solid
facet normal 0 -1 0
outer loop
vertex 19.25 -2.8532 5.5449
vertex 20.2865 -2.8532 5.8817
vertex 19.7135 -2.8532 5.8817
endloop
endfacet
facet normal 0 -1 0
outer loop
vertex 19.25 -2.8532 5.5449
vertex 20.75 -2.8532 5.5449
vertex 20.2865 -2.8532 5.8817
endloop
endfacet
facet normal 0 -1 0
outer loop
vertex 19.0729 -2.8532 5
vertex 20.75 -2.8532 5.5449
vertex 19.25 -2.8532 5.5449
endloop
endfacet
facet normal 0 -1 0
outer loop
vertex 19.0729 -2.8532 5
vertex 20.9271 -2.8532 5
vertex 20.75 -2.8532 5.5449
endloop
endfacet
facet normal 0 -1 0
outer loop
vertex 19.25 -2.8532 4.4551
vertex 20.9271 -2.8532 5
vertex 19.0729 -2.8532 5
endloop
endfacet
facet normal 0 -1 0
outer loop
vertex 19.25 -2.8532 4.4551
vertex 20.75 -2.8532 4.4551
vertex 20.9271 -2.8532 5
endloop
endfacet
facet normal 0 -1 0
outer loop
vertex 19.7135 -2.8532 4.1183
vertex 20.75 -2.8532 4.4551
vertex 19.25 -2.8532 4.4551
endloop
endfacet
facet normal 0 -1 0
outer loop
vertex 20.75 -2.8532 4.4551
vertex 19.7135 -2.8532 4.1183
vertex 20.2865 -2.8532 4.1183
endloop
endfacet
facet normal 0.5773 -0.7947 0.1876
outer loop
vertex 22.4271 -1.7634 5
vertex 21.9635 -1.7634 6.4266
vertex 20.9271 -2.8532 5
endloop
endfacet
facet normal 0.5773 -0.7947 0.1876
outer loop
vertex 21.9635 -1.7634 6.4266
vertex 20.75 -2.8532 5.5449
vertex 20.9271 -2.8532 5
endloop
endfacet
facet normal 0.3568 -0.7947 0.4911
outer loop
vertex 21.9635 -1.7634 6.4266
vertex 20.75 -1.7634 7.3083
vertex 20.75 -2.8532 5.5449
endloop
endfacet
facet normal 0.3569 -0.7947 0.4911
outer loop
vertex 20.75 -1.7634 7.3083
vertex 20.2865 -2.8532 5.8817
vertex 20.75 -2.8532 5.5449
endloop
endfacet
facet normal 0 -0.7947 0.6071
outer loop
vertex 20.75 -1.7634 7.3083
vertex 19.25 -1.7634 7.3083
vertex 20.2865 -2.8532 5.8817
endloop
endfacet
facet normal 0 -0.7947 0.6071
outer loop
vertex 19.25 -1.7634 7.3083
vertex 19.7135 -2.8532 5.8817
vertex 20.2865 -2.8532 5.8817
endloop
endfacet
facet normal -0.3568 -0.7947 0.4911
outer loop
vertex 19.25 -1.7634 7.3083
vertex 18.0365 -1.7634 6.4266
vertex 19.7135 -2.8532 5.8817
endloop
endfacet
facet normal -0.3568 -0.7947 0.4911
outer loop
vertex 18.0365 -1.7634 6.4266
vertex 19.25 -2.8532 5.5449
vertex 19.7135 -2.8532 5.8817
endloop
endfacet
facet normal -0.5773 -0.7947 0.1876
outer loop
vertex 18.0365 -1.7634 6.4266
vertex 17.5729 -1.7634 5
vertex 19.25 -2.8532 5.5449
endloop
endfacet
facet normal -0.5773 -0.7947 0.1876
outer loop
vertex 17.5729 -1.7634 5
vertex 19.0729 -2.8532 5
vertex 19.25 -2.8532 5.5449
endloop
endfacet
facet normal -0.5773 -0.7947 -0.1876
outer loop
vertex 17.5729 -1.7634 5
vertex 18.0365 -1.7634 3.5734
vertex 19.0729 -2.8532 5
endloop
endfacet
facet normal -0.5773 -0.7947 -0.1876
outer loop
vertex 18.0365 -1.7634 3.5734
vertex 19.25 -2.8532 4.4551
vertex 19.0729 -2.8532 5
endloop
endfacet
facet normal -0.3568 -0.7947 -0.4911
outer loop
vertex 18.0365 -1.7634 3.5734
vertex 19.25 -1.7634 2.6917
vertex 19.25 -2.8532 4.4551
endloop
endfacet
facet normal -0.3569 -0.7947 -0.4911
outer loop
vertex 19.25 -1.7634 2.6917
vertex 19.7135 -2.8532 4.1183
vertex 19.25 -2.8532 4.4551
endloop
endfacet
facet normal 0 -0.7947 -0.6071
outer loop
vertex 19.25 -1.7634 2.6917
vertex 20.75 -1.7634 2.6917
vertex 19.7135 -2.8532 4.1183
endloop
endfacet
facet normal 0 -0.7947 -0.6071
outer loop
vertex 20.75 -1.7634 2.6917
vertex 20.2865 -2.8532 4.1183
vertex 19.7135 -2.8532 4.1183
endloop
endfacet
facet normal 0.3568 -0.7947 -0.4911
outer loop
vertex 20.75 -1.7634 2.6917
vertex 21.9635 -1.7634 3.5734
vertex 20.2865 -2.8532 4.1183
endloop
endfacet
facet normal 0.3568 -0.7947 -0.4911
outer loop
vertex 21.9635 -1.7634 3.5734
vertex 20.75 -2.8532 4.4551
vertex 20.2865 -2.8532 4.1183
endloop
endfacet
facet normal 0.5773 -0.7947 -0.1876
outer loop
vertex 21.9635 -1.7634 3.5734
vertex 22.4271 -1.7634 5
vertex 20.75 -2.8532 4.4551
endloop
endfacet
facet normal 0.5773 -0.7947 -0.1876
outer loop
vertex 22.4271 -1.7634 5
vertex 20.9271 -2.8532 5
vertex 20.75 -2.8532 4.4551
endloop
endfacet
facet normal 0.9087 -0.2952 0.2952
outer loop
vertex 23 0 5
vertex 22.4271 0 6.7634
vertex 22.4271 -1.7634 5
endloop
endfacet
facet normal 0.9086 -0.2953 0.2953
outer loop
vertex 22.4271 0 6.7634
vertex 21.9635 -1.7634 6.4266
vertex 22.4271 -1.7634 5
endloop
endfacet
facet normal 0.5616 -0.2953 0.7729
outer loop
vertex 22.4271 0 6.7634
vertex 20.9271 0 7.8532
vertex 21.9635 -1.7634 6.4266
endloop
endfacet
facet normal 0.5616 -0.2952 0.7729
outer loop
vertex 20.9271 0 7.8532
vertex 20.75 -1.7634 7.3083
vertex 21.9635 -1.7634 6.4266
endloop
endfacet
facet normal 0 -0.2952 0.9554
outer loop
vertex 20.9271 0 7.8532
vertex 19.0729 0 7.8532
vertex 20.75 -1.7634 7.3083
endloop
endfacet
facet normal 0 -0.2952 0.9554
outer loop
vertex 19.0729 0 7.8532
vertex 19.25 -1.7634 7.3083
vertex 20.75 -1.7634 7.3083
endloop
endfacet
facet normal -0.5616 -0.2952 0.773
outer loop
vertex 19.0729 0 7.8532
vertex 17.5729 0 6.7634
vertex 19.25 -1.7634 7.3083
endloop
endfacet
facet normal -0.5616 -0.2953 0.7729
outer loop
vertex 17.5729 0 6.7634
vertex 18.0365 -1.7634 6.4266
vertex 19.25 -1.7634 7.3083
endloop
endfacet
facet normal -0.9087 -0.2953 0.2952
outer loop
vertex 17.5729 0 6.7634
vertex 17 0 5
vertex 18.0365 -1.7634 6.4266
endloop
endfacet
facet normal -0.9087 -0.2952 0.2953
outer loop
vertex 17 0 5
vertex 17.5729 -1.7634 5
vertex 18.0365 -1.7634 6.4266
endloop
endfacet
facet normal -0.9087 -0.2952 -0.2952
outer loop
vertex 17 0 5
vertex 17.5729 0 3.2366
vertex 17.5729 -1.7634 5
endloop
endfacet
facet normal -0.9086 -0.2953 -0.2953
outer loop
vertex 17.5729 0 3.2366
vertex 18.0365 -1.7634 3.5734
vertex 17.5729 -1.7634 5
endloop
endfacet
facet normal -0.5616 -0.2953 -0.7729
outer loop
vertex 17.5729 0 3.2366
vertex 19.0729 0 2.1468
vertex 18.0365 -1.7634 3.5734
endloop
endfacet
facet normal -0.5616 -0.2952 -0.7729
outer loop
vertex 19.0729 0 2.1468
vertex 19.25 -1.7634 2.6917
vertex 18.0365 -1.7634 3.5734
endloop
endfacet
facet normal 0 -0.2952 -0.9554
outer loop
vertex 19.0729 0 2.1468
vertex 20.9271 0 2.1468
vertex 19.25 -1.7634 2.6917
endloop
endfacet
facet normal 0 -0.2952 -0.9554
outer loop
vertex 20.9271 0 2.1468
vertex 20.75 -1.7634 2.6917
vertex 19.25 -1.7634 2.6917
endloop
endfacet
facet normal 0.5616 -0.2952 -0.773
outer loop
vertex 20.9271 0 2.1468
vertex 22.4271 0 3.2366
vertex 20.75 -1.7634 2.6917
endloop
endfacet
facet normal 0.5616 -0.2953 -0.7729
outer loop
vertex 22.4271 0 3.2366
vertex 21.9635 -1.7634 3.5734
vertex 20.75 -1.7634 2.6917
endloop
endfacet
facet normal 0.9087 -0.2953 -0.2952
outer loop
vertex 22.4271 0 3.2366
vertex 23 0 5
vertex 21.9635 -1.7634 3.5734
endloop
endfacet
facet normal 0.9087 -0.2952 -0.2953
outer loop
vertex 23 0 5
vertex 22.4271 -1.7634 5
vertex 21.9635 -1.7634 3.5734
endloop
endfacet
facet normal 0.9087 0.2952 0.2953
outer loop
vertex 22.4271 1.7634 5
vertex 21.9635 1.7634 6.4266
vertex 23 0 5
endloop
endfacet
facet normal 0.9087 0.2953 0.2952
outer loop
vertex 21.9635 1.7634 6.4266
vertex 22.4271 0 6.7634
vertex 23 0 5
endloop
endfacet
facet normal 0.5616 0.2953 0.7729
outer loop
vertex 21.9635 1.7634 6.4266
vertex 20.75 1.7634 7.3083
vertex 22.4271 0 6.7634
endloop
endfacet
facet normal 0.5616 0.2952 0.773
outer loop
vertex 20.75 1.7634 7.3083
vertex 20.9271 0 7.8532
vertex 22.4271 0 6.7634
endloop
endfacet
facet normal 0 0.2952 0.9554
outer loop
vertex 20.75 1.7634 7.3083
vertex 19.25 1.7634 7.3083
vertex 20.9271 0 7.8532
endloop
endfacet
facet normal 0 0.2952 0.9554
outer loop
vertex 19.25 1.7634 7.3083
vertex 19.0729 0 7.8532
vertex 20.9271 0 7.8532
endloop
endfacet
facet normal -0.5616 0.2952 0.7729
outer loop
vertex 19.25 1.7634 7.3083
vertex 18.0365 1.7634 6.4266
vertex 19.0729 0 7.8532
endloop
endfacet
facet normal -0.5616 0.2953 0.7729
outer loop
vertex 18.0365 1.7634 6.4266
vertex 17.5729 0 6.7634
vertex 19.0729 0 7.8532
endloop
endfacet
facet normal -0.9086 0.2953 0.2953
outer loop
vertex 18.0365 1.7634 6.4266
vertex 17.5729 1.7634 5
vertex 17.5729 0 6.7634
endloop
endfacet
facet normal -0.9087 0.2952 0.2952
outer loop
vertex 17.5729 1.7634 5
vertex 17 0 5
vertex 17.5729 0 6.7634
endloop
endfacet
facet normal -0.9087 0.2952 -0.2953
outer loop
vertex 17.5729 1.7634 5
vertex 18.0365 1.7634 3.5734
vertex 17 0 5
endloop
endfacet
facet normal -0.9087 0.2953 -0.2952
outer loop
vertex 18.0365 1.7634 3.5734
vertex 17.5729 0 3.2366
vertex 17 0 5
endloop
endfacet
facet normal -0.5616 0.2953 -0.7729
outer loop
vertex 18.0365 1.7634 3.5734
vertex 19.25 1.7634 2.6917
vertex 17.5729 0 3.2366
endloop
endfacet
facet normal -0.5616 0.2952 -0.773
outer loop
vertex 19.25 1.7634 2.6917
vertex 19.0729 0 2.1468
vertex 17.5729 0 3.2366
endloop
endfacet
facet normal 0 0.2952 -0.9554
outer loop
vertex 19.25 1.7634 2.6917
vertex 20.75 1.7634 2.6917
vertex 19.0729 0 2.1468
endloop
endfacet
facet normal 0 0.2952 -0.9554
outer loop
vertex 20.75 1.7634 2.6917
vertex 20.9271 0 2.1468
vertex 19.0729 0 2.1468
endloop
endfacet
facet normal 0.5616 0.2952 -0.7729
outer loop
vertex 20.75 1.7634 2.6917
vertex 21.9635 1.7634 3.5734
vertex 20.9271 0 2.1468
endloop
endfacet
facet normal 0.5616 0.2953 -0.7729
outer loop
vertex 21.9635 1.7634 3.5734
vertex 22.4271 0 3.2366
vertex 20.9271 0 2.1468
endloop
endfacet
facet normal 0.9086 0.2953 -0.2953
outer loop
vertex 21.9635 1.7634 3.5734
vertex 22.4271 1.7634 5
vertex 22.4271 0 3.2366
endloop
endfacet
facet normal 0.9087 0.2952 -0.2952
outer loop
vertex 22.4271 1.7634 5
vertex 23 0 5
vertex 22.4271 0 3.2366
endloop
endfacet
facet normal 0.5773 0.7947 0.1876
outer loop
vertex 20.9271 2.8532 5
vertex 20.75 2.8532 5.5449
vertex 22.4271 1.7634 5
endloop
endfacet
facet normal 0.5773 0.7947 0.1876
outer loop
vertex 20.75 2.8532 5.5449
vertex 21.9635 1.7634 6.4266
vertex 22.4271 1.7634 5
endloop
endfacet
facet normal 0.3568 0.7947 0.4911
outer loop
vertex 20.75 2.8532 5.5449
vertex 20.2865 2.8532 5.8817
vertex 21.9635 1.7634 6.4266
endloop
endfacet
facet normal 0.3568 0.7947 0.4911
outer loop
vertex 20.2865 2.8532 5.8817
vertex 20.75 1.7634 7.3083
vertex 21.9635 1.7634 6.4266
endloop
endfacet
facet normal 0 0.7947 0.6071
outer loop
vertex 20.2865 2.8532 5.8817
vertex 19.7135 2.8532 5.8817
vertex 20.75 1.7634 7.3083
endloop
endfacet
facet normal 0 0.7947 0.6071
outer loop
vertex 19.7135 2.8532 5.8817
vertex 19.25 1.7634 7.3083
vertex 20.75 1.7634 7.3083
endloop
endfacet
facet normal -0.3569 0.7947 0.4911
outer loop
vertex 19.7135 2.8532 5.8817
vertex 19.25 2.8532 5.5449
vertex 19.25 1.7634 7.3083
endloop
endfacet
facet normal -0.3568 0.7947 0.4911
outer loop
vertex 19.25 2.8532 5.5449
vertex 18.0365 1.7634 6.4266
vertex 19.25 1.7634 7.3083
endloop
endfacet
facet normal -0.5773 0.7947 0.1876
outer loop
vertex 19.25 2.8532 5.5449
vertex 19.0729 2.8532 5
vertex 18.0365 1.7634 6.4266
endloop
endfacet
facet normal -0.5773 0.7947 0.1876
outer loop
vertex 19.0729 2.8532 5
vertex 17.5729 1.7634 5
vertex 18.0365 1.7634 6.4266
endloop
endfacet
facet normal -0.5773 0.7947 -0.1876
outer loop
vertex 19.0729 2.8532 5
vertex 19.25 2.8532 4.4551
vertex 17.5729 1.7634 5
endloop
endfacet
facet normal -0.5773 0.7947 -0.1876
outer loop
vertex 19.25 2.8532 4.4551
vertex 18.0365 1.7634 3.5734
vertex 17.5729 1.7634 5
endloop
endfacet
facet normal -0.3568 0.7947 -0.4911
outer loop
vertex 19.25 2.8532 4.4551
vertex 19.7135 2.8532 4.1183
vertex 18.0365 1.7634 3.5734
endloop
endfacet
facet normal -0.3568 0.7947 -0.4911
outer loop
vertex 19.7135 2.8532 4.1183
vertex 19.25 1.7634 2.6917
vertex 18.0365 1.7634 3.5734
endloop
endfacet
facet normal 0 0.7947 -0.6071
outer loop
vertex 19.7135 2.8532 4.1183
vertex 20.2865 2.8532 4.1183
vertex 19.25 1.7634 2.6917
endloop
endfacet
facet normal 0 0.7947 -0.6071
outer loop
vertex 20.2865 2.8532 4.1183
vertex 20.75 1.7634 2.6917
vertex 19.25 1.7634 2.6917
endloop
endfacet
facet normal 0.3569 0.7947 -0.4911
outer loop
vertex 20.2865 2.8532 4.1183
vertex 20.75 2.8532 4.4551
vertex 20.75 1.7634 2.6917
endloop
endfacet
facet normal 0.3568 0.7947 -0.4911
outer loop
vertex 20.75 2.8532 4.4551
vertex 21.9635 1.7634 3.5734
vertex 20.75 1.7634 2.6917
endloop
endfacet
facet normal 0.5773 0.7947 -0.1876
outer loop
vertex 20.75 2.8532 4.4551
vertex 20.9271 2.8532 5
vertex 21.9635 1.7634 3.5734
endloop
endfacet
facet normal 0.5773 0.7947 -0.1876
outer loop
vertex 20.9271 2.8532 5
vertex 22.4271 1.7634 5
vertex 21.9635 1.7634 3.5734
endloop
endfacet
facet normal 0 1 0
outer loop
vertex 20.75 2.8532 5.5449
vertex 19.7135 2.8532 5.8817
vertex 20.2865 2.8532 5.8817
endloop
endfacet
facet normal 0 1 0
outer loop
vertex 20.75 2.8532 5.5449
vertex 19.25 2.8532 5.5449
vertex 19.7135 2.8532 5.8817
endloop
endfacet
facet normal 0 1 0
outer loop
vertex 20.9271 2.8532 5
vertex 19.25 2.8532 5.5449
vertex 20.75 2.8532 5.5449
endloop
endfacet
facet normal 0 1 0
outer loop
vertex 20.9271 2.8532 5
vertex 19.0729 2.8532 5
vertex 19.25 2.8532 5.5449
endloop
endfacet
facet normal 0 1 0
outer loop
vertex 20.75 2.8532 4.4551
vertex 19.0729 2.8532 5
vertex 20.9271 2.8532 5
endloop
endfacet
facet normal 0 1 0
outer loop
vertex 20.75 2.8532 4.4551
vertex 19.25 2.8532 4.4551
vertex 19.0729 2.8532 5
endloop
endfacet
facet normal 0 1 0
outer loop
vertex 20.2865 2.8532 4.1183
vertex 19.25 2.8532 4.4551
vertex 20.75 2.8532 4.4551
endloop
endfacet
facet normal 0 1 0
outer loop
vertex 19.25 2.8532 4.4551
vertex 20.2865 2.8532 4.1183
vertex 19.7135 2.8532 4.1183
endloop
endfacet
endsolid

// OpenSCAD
translate([20, 0, 0]) rotate([90, 0, 0]) translate([0, 5, 0]) sphere(r = 3);
